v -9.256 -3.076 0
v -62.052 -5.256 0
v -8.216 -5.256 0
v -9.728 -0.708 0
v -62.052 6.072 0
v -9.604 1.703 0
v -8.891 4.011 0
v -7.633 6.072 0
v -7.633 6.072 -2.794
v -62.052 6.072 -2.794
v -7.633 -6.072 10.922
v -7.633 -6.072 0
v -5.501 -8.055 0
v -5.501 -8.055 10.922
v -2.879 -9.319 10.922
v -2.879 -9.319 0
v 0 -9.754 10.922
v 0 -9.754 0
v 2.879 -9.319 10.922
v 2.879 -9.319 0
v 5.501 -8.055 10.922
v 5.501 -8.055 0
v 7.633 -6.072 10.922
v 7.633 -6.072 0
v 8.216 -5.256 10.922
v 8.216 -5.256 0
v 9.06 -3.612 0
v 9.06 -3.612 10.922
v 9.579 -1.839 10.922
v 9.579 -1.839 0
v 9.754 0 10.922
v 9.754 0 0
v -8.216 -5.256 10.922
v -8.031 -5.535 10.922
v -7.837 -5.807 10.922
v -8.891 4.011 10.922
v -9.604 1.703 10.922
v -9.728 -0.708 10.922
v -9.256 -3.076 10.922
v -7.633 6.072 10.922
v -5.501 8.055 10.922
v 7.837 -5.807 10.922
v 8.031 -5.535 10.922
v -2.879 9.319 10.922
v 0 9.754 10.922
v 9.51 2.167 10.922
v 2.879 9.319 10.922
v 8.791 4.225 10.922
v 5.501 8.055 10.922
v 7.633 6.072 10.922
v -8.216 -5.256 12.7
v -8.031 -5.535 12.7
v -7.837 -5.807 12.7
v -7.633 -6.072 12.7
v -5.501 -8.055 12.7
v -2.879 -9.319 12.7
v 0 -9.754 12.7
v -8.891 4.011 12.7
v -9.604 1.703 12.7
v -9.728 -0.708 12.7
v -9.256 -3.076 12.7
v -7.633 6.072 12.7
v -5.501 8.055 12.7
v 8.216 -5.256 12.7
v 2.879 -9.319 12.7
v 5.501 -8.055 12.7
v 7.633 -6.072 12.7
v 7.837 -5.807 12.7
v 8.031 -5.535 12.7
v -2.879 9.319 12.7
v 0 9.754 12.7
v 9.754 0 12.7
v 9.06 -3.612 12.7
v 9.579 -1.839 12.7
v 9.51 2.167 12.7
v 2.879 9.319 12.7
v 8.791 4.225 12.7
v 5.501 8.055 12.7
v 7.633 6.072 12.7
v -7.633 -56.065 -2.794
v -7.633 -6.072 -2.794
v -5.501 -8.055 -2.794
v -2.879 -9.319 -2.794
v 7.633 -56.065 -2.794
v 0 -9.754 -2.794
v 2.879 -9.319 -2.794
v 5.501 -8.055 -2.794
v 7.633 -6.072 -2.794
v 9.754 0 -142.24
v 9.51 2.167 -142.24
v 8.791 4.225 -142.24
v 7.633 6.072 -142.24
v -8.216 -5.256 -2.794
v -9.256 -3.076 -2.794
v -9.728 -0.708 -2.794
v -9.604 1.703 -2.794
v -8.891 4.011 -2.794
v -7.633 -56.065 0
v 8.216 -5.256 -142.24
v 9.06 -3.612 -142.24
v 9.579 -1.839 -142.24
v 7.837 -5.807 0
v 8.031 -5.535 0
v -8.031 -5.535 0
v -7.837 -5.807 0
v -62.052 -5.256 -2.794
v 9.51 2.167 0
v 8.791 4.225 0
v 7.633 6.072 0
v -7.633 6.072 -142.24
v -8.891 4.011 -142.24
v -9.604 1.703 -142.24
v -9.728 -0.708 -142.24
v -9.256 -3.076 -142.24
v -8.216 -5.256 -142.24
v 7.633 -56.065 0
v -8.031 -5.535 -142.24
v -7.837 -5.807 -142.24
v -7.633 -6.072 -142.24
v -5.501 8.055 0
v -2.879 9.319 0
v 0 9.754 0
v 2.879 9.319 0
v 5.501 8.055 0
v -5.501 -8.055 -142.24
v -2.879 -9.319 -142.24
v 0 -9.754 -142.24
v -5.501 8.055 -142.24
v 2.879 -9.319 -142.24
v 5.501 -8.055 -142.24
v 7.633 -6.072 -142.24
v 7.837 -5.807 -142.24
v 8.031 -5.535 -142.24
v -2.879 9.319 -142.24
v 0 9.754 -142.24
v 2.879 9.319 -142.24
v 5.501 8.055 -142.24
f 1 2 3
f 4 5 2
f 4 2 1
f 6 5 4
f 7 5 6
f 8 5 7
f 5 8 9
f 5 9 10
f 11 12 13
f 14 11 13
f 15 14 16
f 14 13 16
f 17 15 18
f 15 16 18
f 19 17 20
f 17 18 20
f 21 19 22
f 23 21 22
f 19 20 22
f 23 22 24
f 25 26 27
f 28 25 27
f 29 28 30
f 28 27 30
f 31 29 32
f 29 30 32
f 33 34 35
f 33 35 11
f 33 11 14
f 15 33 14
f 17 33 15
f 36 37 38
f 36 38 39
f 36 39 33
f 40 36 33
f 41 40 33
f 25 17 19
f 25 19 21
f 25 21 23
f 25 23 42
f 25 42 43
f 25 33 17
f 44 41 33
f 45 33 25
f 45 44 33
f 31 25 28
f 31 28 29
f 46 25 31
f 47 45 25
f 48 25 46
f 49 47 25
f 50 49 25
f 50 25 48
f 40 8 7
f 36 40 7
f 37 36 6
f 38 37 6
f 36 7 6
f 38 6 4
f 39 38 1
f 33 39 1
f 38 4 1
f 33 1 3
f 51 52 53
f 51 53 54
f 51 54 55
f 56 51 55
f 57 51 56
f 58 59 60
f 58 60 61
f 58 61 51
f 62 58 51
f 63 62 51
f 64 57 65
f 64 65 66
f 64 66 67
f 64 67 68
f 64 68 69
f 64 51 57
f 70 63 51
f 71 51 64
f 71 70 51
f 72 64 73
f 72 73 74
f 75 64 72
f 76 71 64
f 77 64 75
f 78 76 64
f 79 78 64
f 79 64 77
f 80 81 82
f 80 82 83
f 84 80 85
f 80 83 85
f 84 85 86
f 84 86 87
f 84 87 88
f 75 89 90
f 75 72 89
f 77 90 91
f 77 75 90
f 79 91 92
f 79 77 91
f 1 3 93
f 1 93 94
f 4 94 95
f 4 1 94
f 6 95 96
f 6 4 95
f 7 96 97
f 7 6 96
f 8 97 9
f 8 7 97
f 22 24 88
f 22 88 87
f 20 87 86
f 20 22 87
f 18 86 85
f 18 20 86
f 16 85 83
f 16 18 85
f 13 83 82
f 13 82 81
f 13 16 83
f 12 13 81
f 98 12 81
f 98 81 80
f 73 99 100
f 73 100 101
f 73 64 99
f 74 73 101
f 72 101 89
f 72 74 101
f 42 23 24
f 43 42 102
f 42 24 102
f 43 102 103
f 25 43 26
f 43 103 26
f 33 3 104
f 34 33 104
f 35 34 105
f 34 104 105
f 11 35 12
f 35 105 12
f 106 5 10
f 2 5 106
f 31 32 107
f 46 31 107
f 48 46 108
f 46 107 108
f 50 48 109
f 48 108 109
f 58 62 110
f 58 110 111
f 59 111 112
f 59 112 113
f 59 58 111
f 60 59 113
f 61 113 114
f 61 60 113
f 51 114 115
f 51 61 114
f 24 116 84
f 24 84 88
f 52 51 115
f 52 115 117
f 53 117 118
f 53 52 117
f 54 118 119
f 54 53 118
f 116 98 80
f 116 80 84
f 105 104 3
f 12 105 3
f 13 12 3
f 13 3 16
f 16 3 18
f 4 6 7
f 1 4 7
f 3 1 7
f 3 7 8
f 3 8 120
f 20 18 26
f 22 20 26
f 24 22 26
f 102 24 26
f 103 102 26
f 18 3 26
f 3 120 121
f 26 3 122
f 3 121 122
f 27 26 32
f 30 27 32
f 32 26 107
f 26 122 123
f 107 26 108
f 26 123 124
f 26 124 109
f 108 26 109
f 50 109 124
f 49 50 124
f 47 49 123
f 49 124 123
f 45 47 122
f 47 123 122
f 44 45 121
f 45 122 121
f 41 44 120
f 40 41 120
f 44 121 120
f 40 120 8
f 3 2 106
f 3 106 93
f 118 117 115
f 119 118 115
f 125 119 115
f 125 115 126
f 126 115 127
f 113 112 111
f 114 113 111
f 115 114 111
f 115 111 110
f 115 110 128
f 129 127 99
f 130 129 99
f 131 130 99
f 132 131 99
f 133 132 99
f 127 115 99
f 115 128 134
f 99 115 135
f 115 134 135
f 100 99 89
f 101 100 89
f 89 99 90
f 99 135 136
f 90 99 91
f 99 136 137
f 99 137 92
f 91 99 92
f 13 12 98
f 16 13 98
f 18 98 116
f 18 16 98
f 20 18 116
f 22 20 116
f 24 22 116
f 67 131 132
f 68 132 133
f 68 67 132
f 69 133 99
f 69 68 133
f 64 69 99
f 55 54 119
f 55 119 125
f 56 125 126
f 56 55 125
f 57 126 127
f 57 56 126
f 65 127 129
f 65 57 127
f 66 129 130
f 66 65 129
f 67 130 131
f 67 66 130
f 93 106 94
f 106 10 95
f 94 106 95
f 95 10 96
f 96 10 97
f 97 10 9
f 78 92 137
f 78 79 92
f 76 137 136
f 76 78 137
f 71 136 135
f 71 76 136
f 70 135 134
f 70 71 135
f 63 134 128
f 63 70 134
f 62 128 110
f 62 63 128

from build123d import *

# Parameters (mm, degrees)
F1_DEPTH      = 10.922
F2_DEPTH      = 2.794
F3_DEPTH      = 12.7
F3_DEPTH_BACK = 142.24


with BuildPart() as f1:
    # F0 (on Top) → F1 (new body)
    with BuildSketch(Plane.XY):
        with BuildLine():
            Line((7.633295, -5.256131), (7.633295, 6.072079))
            Line((7.633295, 6.072079), (-7.633295, 6.072079))
            Line((-7.633295, 6.072079), (-7.633295, -5.256131))
            Line((-7.633295, -5.256131), (-8.216472, -5.256131))
            ThreePointArc((-8.216472, -5.256131), (-7.935378, -5.671606), (-7.633295, -6.072079))
            Line((-7.633295, -6.072079), (7.633295, -6.072079))
            ThreePointArc((7.633295, -6.072079), (7.935378, -5.671606), (8.216472, -5.256131))
            Line((8.216472, -5.256131), (7.633295, -5.256131))
        make_face()
        with BuildLine():
            Line((-7.633295, 6.072079), (7.633295, 6.072079))
            ThreePointArc((7.633295, 6.072079), (0, 9.753837), (-7.633295, 6.072079))
        make_face()
        with BuildLine():
            Line((-7.633295, -5.256131), (-7.633295, 6.072079))
            ThreePointArc((-7.633295, 6.072079), (-9.740938, 0.501464), (-8.216472, -5.256131))
            Line((-8.216472, -5.256131), (-7.633295, -5.256131))
        make_face()
        with BuildLine():
            ThreePointArc((-7.633295, -6.072079), (0, -9.753837), (7.633295, -6.072079))
            Line((7.633295, -6.072079), (-7.633295, -6.072079))
        make_face()
        with BuildLine():
            ThreePointArc((8.216472, -5.256131), (9.36161, -2.738175), (9.753837, 0))
            ThreePointArc((9.753837, 0), (9.208454, 3.215853), (7.633295, 6.072079))
            Line((7.633295, 6.072079), (7.633295, -5.256131))
            Line((7.633295, -5.256131), (8.216472, -5.256131))
        make_face()
    extrude(amount=F1_DEPTH)


with BuildPart() as f2:
    # F0 (on Top) → F2 (new body)
    with BuildSketch(Plane.XY):
        with BuildLine():
            Line((7.633295, -56.065399), (7.633295, -6.072079))
            ThreePointArc((7.633295, -6.072079), (0, -9.753837), (-7.633295, -6.072079))
            Line((-7.633295, -6.072079), (-7.633295, -56.065399))
            Line((-7.633295, -56.065399), (7.633295, -56.065399))
        make_face()
        with BuildLine():
            ThreePointArc((-8.216472, -5.256131), (-9.740938, 0.501464), (-7.633295, 6.072079))
            Line((-7.633295, 6.072079), (-62.05155, 6.072079))
            Line((-62.05155, 6.072079), (-62.05155, -5.256131))
            Line((-62.05155, -5.256131), (-8.216472, -5.256131))
        make_face()
    extrude(amount=-F2_DEPTH)


with BuildPart() as f3:
    # F0 (on Top) → F3 (new body, two sides)
    with BuildSketch(Plane.XY) as f3_sk:
        with BuildLine():
            Line((7.633295, -5.256131), (7.633295, 6.072079))
            Line((7.633295, 6.072079), (-7.633295, 6.072079))
            Line((-7.633295, 6.072079), (-7.633295, -5.256131))
            Line((-7.633295, -5.256131), (-8.216472, -5.256131))
            ThreePointArc((-8.216472, -5.256131), (-7.935378, -5.671606), (-7.633295, -6.072079))
            Line((-7.633295, -6.072079), (7.633295, -6.072079))
            ThreePointArc((7.633295, -6.072079), (7.935378, -5.671606), (8.216472, -5.256131))
            Line((8.216472, -5.256131), (7.633295, -5.256131))
        make_face()
        with BuildLine():
            ThreePointArc((-7.633295, -6.072079), (0, -9.753837), (7.633295, -6.072079))
            Line((7.633295, -6.072079), (-7.633295, -6.072079))
        make_face()
        with BuildLine():
            Line((-7.633295, 6.072079), (7.633295, 6.072079))
            ThreePointArc((7.633295, 6.072079), (0, 9.753837), (-7.633295, 6.072079))
        make_face()
        with BuildLine():
            Line((-7.633295, -5.256131), (-7.633295, 6.072079))
            ThreePointArc((-7.633295, 6.072079), (-9.740938, 0.501464), (-8.216472, -5.256131))
            Line((-8.216472, -5.256131), (-7.633295, -5.256131))
        make_face()
        with BuildLine():
            ThreePointArc((8.216472, -5.256131), (9.36161, -2.738175), (9.753837, 0))
            ThreePointArc((9.753837, 0), (9.208454, 3.215853), (7.633295, 6.072079))
            Line((7.633295, 6.072079), (7.633295, -5.256131))
            Line((7.633295, -5.256131), (8.216472, -5.256131))
        make_face()
    extrude(amount=F3_DEPTH)
    extrude(f3_sk.sketch, amount=-F3_DEPTH_BACK)


solid = Compound([f1.part, f2.part, f3.part])
